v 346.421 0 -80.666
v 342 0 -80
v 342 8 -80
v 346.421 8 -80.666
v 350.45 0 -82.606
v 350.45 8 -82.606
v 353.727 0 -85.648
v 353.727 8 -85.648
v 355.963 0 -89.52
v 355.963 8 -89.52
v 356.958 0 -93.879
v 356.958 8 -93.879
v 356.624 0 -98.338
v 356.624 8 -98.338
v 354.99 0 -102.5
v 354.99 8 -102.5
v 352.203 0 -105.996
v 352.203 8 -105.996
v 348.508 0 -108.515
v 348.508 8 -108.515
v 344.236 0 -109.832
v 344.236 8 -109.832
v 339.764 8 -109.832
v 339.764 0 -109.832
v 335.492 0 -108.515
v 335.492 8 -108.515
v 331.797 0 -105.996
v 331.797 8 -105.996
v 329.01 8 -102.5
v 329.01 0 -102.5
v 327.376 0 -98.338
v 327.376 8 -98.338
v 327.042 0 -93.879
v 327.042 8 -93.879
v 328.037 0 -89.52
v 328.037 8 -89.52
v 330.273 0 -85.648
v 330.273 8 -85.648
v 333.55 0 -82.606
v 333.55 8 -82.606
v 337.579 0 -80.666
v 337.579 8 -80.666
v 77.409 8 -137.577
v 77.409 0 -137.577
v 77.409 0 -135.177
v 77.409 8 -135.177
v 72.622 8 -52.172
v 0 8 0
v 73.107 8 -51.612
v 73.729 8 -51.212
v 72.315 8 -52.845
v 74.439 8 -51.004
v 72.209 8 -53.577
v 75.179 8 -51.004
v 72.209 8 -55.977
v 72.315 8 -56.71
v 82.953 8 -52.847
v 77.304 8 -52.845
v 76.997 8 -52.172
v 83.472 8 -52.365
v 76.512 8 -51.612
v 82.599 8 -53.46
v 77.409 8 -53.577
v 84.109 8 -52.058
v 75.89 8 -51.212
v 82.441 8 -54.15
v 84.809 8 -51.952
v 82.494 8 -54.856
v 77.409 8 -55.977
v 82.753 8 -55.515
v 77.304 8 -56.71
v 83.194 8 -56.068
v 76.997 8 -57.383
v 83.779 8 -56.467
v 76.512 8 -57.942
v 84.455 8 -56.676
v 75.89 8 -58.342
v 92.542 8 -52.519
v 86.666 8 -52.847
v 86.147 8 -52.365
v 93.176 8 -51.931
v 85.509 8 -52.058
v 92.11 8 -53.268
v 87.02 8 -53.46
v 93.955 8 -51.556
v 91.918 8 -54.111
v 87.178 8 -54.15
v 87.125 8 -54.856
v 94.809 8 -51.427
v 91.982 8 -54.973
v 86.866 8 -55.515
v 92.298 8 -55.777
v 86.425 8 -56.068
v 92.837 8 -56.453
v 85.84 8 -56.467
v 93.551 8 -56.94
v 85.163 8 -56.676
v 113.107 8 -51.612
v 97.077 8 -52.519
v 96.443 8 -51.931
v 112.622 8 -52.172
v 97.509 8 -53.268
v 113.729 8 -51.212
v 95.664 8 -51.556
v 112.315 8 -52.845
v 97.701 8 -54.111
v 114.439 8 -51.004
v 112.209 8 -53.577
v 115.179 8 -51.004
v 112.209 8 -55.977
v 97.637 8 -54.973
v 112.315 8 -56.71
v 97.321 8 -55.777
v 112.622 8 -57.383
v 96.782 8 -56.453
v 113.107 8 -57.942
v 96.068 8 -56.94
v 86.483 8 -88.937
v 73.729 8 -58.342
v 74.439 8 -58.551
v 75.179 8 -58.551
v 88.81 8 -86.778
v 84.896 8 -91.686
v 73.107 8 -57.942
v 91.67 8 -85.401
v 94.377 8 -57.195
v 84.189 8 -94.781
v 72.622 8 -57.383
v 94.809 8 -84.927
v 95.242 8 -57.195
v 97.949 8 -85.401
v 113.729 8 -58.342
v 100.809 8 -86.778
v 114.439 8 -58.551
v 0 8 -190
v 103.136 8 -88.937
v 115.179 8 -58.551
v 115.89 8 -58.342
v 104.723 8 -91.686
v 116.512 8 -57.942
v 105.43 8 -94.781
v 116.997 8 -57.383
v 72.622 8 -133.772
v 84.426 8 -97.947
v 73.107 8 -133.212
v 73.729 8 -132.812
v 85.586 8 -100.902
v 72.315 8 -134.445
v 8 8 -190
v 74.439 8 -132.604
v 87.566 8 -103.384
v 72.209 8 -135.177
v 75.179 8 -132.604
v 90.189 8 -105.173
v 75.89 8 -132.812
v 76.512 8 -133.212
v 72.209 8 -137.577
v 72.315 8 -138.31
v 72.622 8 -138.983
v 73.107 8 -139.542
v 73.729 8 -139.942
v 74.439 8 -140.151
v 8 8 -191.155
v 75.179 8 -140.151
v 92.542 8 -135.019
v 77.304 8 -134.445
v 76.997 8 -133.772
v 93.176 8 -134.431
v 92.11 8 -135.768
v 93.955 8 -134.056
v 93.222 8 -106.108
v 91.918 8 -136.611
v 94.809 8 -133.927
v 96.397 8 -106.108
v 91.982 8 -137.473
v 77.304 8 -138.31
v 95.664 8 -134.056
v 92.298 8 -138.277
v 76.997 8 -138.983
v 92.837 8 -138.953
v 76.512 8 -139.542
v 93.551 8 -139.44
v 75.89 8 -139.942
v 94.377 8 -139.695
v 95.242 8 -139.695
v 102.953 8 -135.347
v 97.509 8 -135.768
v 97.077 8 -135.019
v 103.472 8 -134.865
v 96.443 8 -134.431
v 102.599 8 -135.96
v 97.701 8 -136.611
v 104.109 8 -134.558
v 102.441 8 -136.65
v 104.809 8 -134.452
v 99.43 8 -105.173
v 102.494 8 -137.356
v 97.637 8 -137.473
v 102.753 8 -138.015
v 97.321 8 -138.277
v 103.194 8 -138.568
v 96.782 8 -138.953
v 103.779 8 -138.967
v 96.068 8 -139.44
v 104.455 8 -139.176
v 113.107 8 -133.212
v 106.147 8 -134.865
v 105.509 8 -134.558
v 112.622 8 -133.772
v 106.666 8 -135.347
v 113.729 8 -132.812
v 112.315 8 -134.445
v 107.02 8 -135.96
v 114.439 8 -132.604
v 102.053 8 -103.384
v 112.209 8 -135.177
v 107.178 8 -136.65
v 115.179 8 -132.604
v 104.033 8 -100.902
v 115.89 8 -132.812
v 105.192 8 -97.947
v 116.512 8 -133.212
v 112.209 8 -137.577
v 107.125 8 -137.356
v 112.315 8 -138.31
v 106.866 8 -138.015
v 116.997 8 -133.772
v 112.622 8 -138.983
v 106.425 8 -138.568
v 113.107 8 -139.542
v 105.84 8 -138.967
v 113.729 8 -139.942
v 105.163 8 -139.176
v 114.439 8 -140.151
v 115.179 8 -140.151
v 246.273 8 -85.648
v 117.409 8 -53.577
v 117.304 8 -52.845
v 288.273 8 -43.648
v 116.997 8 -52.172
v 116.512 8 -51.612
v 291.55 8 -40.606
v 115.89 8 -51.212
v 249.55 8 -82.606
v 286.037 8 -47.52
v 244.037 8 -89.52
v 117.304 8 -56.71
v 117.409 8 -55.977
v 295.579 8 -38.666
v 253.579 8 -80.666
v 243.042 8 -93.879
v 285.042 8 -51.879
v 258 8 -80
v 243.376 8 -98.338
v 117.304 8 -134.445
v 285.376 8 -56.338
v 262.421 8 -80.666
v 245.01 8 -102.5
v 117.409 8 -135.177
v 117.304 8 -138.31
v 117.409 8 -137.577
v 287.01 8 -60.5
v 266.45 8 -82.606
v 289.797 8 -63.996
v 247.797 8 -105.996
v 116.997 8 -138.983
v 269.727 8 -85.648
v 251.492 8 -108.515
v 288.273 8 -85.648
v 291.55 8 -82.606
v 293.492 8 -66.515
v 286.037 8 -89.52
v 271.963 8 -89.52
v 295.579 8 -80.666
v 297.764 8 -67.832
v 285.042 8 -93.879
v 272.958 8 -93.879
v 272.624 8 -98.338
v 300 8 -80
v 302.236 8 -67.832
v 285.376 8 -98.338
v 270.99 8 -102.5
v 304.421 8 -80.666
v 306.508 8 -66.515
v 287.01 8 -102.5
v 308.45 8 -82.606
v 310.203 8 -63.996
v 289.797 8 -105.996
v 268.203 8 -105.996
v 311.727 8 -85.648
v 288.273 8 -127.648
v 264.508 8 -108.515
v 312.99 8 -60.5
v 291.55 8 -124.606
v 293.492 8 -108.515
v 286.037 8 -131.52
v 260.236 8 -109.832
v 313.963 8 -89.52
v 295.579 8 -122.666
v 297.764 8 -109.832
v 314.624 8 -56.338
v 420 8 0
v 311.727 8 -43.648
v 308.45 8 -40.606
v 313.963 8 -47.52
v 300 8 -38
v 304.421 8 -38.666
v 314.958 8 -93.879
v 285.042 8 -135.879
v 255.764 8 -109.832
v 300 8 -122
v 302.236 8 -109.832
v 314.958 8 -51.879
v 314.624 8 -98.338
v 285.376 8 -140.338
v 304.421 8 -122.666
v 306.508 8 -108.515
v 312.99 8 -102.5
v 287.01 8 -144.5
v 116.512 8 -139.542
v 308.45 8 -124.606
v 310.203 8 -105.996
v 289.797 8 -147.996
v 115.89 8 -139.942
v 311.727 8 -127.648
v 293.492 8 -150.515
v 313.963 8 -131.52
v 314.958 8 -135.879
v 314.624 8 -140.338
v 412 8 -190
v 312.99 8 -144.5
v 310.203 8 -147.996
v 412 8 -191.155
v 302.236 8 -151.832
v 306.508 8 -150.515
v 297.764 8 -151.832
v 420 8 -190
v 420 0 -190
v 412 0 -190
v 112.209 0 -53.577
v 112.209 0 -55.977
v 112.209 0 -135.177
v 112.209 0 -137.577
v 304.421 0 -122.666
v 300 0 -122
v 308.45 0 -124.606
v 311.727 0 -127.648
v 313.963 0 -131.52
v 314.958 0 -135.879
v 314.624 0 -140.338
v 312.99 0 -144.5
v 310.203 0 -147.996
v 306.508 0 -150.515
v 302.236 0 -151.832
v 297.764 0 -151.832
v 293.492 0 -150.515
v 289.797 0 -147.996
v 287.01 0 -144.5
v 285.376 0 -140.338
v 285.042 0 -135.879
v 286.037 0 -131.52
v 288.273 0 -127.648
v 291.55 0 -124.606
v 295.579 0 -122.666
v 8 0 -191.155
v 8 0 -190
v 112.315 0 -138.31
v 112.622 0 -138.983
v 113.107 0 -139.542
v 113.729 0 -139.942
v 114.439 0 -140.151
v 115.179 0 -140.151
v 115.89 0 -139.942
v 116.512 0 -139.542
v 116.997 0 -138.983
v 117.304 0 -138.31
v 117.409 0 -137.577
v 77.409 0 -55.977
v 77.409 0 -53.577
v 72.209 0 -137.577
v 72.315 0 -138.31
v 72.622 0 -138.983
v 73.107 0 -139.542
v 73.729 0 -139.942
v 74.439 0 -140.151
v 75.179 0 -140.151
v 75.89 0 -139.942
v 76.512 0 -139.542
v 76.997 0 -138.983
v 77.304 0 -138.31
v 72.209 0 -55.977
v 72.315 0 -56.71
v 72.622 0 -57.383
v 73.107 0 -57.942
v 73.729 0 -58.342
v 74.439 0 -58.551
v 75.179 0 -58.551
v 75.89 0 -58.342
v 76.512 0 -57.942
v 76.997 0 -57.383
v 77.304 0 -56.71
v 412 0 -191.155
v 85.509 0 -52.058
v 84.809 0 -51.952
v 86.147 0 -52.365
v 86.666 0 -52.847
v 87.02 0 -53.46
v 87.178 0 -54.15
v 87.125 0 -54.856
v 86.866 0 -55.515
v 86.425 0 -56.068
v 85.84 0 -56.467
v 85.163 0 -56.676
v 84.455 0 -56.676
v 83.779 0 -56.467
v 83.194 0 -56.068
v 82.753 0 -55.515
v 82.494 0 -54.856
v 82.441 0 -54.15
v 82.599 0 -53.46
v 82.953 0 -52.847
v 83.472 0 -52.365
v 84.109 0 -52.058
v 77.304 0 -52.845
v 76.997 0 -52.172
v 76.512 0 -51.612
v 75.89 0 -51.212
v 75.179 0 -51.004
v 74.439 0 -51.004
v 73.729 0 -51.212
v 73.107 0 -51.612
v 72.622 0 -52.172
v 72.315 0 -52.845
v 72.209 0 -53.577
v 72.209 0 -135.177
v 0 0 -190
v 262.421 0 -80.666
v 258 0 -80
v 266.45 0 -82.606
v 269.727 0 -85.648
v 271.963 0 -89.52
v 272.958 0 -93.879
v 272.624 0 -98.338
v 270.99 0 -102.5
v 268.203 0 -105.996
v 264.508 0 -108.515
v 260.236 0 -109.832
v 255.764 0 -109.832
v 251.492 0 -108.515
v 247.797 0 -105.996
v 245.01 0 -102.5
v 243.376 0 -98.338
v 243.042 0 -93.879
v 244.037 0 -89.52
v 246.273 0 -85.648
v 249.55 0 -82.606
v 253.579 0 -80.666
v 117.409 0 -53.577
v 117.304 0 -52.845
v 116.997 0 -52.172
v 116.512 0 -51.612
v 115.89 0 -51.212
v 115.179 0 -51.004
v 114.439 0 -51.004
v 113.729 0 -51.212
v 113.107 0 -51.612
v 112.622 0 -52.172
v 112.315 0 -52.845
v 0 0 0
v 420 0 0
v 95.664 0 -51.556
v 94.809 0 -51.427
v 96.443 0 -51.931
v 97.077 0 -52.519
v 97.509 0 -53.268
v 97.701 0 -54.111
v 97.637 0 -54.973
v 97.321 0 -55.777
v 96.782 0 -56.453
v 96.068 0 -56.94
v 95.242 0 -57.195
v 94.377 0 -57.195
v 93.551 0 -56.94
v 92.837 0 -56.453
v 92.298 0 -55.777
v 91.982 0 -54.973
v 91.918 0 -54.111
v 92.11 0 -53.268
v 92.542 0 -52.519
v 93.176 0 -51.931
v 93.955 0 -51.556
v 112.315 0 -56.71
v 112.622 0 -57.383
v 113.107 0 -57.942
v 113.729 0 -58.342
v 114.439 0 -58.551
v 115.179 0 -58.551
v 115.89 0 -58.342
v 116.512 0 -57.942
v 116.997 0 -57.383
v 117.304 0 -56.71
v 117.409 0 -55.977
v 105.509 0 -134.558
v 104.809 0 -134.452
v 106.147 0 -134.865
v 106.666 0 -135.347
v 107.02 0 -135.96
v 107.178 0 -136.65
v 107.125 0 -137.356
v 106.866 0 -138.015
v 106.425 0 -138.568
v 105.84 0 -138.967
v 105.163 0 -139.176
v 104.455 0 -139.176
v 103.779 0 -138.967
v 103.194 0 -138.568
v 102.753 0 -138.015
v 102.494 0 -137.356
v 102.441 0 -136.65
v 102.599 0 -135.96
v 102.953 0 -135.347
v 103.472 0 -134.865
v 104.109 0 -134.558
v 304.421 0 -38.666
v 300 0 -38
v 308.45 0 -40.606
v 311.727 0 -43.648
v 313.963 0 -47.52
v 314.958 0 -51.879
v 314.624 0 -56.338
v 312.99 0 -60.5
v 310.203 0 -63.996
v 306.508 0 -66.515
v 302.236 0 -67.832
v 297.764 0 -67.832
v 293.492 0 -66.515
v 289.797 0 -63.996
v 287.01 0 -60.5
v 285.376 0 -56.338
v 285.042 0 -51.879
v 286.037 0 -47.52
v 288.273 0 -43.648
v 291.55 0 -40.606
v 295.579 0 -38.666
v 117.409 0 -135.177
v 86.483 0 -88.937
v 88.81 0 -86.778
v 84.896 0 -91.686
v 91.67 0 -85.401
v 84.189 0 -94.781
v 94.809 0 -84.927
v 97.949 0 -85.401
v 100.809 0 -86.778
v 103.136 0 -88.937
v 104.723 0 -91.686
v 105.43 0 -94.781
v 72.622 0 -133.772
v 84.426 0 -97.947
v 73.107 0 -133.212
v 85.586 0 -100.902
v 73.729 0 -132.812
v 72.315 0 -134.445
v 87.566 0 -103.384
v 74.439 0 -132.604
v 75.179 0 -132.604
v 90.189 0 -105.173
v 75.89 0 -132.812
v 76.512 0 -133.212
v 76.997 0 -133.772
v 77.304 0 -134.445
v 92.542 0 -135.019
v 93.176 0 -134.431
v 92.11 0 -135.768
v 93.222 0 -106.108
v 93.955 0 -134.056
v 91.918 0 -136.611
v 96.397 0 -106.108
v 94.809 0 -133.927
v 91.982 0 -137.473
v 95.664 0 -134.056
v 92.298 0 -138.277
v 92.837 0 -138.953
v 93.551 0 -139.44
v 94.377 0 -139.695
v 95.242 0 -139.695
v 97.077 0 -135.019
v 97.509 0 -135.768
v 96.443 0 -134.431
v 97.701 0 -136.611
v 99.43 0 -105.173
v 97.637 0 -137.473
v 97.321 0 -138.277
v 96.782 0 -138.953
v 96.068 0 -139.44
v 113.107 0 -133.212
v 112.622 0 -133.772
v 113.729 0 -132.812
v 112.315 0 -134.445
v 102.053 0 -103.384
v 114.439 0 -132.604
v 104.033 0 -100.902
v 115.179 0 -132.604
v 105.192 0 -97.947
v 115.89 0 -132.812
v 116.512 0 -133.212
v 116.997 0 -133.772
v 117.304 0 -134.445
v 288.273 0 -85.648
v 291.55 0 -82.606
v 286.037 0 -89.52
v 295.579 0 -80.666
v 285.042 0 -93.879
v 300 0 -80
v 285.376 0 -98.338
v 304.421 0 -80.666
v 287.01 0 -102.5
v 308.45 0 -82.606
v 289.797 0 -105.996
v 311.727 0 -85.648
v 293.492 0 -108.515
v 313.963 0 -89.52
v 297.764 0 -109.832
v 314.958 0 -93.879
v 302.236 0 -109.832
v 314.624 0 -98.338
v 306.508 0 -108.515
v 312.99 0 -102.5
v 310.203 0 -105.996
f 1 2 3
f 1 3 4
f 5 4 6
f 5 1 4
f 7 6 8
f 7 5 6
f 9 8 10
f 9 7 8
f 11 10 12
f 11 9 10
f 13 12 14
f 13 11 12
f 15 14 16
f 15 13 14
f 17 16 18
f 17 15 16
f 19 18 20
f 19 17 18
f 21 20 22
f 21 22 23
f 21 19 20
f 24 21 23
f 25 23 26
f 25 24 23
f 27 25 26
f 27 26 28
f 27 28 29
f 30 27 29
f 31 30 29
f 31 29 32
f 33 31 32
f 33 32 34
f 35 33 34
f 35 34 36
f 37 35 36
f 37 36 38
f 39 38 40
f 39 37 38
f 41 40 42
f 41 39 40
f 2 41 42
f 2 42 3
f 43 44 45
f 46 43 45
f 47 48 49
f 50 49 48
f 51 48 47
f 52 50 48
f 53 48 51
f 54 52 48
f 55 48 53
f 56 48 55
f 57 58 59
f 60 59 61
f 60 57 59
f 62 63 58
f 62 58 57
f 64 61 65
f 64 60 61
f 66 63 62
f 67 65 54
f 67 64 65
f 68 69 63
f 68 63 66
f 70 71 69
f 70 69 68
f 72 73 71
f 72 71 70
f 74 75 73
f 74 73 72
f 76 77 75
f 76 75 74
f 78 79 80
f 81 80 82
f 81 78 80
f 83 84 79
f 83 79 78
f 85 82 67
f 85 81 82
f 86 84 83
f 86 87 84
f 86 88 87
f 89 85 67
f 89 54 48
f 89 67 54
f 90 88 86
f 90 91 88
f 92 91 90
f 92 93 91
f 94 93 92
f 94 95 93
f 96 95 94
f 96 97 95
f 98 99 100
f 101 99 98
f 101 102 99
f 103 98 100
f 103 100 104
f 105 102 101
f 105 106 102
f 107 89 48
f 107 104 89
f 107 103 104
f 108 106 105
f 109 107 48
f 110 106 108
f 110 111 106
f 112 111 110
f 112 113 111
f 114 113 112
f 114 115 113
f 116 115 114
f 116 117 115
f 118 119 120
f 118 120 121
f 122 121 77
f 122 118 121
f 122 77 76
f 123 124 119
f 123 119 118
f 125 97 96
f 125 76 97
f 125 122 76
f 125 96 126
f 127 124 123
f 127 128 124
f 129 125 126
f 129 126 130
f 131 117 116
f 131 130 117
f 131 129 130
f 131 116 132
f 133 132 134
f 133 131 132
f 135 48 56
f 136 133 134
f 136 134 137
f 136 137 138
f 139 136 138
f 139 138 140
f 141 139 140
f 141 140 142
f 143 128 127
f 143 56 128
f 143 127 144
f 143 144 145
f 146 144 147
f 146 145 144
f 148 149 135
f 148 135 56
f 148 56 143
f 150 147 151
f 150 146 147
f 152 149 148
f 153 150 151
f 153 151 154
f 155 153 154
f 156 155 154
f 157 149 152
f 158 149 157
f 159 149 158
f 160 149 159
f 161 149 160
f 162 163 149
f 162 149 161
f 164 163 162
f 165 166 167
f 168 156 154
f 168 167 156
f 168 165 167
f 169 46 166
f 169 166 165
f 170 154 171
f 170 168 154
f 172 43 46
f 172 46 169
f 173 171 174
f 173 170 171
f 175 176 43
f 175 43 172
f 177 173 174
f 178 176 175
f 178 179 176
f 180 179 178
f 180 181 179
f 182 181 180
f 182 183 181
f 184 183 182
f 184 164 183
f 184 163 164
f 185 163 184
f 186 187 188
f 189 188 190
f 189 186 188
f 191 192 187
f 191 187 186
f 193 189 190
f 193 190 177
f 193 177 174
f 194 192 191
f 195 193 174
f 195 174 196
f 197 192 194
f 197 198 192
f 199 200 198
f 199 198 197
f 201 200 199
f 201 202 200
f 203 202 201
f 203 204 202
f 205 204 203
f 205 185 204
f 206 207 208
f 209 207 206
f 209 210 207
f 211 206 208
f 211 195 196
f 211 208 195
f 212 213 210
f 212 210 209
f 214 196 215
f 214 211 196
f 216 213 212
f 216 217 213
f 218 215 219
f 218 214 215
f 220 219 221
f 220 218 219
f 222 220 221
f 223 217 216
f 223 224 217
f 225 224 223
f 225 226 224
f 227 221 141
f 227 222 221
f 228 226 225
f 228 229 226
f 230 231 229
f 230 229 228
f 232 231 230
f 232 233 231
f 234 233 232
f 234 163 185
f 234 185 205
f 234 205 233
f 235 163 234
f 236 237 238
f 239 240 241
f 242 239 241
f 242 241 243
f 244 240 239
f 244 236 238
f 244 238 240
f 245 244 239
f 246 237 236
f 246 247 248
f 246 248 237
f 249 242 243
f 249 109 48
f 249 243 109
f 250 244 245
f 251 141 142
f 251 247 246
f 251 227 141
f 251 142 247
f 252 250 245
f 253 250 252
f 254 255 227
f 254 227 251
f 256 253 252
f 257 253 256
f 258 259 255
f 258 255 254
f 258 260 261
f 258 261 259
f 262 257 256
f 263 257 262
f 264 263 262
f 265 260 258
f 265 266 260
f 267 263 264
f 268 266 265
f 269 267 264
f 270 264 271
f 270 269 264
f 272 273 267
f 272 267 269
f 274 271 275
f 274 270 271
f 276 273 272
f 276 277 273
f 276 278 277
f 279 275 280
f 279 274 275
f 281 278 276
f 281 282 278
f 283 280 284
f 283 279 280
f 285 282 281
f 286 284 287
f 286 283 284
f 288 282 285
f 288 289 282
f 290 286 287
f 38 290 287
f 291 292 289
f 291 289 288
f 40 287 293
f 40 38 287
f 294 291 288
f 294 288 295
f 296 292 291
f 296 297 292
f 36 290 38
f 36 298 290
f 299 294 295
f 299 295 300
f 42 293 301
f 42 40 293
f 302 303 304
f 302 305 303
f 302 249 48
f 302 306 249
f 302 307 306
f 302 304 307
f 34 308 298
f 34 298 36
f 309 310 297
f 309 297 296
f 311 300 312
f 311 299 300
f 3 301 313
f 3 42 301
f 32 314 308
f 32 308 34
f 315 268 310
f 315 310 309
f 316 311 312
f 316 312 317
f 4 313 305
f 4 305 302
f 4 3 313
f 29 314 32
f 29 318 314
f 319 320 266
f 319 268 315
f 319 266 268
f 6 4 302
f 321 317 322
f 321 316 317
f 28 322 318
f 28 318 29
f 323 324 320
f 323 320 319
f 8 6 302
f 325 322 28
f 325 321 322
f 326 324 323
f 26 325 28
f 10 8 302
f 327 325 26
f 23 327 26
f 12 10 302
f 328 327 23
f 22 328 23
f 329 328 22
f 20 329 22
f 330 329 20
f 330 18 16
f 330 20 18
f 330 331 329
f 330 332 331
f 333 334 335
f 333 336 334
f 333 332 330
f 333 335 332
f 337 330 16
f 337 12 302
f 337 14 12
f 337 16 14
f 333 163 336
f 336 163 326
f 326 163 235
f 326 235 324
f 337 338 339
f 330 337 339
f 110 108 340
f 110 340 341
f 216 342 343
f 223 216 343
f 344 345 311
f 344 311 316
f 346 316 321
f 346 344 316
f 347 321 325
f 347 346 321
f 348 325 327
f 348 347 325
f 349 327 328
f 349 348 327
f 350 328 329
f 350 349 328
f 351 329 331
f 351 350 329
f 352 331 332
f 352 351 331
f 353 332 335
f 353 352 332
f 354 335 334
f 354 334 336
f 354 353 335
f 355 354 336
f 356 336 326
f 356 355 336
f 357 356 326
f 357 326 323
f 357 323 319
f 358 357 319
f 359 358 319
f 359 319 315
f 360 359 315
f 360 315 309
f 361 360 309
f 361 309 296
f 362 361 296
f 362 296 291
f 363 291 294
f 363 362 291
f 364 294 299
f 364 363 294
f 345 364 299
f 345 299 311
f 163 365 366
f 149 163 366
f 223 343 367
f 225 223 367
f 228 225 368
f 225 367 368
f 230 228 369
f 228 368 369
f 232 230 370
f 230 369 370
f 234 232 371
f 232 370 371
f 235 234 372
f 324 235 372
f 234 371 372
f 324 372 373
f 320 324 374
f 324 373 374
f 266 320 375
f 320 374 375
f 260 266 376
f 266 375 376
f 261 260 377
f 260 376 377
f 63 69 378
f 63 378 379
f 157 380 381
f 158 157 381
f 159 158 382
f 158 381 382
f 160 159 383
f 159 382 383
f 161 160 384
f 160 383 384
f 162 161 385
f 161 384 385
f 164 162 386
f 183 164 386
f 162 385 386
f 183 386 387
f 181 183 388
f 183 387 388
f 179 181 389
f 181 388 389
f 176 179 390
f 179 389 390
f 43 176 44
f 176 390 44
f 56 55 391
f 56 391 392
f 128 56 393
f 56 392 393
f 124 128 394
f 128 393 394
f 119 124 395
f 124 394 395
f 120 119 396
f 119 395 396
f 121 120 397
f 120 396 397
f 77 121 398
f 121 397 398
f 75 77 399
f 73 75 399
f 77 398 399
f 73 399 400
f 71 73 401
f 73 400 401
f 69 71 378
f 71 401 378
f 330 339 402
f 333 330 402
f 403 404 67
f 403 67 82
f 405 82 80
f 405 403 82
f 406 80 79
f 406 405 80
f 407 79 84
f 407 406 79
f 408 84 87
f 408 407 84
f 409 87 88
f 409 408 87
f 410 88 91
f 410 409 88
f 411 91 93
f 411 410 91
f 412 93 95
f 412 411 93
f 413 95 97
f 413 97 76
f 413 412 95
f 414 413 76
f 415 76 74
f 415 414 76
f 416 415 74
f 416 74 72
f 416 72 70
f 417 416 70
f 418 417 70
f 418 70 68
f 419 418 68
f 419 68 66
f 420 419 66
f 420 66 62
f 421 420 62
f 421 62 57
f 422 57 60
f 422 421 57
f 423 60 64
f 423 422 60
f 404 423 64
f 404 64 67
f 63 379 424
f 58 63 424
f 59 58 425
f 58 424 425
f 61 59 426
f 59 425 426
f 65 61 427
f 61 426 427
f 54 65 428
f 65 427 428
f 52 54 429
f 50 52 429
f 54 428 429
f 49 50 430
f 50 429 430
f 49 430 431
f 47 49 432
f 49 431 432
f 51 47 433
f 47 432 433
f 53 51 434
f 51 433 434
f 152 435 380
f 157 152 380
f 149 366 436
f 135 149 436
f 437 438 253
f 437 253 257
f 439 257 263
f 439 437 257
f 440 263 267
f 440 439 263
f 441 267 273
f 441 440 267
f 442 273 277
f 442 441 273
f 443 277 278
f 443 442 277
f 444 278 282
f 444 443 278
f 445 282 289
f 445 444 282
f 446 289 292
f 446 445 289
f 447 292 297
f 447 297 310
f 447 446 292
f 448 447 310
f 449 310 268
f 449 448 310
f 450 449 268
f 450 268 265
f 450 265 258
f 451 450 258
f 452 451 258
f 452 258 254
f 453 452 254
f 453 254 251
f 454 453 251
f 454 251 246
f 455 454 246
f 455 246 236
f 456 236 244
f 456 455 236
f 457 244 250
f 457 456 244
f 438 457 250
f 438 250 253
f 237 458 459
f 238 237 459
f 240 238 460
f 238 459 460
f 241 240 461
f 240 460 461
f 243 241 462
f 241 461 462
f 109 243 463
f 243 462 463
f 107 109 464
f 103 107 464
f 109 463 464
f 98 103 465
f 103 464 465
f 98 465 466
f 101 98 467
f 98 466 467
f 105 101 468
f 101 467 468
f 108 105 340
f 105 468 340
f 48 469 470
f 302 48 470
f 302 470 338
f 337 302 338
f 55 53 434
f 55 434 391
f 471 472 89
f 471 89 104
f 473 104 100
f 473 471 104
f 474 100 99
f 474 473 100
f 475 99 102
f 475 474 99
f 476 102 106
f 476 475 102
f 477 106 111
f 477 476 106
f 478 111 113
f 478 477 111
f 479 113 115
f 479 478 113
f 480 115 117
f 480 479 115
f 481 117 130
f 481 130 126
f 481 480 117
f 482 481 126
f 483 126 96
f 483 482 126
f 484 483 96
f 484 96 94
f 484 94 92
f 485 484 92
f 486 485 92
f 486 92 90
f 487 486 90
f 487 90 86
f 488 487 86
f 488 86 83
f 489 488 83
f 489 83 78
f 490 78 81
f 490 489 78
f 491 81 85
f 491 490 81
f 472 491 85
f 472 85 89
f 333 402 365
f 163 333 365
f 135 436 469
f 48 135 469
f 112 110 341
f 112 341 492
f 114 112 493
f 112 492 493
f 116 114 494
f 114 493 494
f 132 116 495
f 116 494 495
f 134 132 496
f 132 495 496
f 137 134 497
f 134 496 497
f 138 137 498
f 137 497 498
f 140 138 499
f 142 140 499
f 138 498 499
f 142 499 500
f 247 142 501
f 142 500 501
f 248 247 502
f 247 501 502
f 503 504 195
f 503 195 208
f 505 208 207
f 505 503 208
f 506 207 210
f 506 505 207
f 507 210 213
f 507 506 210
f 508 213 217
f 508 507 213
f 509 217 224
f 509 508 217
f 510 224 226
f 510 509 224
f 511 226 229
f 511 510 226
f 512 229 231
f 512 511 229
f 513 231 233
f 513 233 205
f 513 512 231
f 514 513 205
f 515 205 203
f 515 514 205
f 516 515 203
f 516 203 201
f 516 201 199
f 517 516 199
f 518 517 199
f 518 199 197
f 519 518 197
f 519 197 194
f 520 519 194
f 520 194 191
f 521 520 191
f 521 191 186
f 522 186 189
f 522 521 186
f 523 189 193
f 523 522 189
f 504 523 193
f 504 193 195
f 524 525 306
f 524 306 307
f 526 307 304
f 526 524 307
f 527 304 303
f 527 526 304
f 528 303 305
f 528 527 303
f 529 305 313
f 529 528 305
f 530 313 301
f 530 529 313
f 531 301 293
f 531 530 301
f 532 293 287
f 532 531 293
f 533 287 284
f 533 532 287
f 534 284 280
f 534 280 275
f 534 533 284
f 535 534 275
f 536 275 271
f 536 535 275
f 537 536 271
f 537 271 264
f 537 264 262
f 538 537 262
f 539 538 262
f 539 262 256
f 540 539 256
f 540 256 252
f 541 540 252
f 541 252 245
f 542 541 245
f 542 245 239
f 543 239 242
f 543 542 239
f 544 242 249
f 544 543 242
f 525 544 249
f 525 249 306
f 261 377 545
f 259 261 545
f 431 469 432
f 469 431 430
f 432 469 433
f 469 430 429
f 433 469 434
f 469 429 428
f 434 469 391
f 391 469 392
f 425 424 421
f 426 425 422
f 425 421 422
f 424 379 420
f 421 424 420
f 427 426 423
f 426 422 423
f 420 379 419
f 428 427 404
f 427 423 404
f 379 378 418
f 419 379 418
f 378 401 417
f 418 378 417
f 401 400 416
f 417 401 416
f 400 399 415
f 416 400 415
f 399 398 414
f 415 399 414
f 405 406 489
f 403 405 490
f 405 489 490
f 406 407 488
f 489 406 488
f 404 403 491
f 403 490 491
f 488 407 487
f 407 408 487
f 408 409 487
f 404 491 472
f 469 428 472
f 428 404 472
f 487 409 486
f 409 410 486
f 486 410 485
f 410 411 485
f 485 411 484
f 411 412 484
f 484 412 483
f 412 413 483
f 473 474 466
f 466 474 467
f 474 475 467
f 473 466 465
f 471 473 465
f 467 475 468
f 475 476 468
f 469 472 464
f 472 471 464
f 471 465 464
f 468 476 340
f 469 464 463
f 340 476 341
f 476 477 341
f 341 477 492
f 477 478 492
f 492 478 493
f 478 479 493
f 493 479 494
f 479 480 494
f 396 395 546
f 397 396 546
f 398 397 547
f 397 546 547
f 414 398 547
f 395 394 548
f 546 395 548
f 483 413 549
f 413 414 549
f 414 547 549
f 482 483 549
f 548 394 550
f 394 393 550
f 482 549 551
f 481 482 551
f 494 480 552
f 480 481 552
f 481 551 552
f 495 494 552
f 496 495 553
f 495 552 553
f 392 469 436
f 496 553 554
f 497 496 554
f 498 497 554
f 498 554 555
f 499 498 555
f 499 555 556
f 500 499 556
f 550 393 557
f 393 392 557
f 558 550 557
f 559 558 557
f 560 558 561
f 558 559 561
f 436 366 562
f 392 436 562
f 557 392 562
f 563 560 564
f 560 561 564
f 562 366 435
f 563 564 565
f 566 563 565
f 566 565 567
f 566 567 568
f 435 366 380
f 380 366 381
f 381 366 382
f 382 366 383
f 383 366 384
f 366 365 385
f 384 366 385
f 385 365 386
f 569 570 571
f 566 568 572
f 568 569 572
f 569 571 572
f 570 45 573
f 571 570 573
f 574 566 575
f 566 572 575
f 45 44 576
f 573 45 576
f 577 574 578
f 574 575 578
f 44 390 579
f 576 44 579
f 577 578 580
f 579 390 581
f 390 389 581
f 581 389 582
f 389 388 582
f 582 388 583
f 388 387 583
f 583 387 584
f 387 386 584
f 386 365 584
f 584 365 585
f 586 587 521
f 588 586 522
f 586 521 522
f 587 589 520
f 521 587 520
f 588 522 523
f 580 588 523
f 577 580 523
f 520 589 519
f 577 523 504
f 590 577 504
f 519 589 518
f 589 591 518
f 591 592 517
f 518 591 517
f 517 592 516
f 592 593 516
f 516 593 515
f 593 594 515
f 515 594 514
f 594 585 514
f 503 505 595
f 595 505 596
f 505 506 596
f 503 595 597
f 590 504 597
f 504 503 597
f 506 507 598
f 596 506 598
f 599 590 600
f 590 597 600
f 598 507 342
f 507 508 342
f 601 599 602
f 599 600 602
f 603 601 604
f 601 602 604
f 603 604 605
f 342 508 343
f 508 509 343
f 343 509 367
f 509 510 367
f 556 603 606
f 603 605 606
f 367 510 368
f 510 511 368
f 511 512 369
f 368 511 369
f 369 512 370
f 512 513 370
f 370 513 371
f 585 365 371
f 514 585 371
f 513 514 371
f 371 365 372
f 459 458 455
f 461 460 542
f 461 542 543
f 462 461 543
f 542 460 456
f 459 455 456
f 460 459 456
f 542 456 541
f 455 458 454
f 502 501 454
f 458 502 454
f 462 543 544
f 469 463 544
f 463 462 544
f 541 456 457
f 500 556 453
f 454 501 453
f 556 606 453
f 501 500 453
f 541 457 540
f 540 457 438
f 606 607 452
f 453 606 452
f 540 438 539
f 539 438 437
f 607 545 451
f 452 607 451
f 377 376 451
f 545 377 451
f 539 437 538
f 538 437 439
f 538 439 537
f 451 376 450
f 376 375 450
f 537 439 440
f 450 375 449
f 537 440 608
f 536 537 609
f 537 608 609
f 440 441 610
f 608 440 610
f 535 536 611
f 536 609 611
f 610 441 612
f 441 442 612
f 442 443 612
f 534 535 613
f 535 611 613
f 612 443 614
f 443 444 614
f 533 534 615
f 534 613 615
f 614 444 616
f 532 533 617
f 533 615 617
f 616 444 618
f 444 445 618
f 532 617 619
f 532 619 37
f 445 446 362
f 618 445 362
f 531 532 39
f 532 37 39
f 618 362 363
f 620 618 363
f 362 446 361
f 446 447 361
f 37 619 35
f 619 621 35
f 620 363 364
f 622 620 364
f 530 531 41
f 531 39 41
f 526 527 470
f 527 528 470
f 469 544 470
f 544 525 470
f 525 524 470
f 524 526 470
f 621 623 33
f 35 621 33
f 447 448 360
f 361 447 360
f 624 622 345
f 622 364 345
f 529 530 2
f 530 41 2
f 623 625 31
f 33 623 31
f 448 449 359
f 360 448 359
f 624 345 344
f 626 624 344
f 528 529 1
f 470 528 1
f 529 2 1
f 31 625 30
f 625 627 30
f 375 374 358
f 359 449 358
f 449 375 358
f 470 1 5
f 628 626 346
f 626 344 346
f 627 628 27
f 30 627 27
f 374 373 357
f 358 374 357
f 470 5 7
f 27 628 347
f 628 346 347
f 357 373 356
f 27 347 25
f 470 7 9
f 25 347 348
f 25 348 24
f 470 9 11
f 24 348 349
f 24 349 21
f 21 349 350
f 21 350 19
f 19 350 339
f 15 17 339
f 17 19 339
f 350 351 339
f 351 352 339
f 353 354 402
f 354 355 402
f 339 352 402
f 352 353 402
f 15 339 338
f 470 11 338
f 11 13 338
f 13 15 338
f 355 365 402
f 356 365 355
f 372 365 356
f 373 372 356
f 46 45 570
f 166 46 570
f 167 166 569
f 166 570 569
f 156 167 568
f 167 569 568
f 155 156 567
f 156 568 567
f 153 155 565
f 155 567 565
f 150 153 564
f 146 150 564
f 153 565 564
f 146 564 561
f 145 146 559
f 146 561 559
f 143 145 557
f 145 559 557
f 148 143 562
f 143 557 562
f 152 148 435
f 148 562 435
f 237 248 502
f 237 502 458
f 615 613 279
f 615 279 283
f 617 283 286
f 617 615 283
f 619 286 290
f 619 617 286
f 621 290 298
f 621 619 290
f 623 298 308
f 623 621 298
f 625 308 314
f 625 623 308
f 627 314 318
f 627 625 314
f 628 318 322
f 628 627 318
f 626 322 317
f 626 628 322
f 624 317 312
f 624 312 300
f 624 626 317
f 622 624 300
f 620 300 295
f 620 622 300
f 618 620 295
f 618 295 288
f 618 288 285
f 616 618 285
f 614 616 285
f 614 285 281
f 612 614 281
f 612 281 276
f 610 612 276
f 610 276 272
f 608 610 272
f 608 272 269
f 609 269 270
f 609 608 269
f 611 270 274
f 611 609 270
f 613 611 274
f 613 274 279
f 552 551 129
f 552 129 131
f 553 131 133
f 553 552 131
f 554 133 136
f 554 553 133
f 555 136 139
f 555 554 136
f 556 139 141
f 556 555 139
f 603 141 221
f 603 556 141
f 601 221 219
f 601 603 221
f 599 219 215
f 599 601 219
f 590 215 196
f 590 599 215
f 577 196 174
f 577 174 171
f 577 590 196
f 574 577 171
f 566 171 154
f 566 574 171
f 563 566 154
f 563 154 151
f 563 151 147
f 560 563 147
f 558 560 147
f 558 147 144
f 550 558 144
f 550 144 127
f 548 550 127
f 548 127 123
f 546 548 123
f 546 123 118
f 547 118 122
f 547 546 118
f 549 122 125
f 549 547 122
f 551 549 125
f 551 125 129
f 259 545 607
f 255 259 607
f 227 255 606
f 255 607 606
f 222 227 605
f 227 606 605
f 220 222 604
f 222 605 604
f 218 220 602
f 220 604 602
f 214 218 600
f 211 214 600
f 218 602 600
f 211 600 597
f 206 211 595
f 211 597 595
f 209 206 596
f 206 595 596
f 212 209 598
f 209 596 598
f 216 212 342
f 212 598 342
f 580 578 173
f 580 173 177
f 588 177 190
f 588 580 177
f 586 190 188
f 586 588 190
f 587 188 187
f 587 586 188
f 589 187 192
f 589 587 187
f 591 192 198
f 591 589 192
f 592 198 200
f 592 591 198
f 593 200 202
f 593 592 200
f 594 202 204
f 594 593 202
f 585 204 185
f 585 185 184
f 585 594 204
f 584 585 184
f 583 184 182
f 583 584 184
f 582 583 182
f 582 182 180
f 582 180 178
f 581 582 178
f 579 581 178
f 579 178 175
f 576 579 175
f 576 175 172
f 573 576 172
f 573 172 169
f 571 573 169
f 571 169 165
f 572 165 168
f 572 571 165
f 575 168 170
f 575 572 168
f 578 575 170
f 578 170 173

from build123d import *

# Parameters (mm, degrees)
SKETCH1_R           = 15
SKETCH1_R_2         = 2.375
SKETCH1_R_3         = 2.9
SKETCH1_R_4         = 10.65
BOSS_EXTRUDE1_DEPTH = 8


with BuildPart() as part:
    # Sketch1 → Boss-Extrude1 (new body)
    with BuildSketch(Plane(origin=(0, 0, 0), x_dir=(1, 0, 0), z_dir=(0, 1, 0))):
        Polygon((8, 191.154701829), (8, 190), (0, 190), (0, 0), (420, 0), (420, 190), (412, 190), (412, 191.154701829), align=None)
        with Locations(Location((300, 137, 0), (0, 0, 270))):
            Circle(SKETCH1_R, mode=Mode.SUBTRACT)
        with Locations(Location((300, 53, 0), (0, 0, 270))):
            Circle(SKETCH1_R, mode=Mode.SUBTRACT)
        with Locations(Location((258, 95, 0), (0, 0, 270))):
            Circle(SKETCH1_R, mode=Mode.SUBTRACT)
        with Locations(Location((300, 95, 0), (0, 0, 270))):
            Circle(SKETCH1_R, mode=Mode.SUBTRACT)
        with Locations(Location((342, 95, 0), (0, 0, 270))):
            Circle(SKETCH1_R, mode=Mode.SUBTRACT)
        with BuildLine():
            Line((112.209434277, 135.177360592), (112.209434277, 137.577360592))
            ThreePointArc((112.209434277, 137.577360592), (114.809434277, 140.177360592), (117.409434277, 137.577360592))
            Line((117.409434277, 137.577360592), (117.409434277, 135.177360592))
            ThreePointArc((117.409434277, 135.177360592), (114.809434277, 132.577360592), (112.209434277, 135.177360592))
        make_face(mode=Mode.SUBTRACT)
        with Locations(Location((104.809434277, 136.82735285, 0), (0, 0, 270))):
            Circle(SKETCH1_R_2, mode=Mode.SUBTRACT)
        with BuildLine():
            Line((72.209434277, 53.577360592), (72.209434277, 55.977360592))
            ThreePointArc((72.209434277, 55.977360592), (74.809434277, 58.577360592), (77.409434277, 55.977360592))
            Line((77.409434277, 55.977360592), (77.409434277, 53.577360592))
            ThreePointArc((77.409434277, 53.577360592), (74.809434277, 50.977360592), (72.209434277, 53.577360592))
        make_face(mode=Mode.SUBTRACT)
        with Locations(Location((84.809434277, 54.327360592, 0), (0, 0, 270))):
            Circle(SKETCH1_R_2, mode=Mode.SUBTRACT)
        with Locations(Location((94.809434277, 54.327360592, 0), (0, 0, 270))):
            Circle(SKETCH1_R_3, mode=Mode.SUBTRACT)
        with BuildLine():
            Line((112.209434277, 53.577360592), (112.209434277, 55.977360592))
            ThreePointArc((112.209434277, 55.977360592), (114.809434277, 58.577360592), (117.409434277, 55.977360592))
            Line((117.409434277, 55.977360592), (117.409434277, 53.577360592))
            ThreePointArc((117.409434277, 53.577360592), (114.809434277, 50.977360592), (112.209434277, 53.577360592))
        make_face(mode=Mode.SUBTRACT)
        with Locations(Location((94.809434277, 95.577360592, 0), (0, 0, 270))):
            Circle(SKETCH1_R_4, mode=Mode.SUBTRACT)
        with BuildLine():
            Line((77.409434277, 137.577360592), (77.409434277, 135.177360592))
            ThreePointArc((77.409434277, 135.177360592), (74.809434277, 132.577360592), (72.209434277, 135.177360592))
            Line((72.209434277, 135.177360592), (72.209434277, 137.577360592))
            ThreePointArc((72.209434277, 137.577360592), (74.809434277, 140.177360592), (77.409434277, 137.577360592))
        make_face(mode=Mode.SUBTRACT)
        with Locations(Location((94.809434277, 136.827360592, 0), (0, 0, 270))):
            Circle(SKETCH1_R_3, mode=Mode.SUBTRACT)
    extrude(amount=BOSS_EXTRUDE1_DEPTH)


solid = part.part
